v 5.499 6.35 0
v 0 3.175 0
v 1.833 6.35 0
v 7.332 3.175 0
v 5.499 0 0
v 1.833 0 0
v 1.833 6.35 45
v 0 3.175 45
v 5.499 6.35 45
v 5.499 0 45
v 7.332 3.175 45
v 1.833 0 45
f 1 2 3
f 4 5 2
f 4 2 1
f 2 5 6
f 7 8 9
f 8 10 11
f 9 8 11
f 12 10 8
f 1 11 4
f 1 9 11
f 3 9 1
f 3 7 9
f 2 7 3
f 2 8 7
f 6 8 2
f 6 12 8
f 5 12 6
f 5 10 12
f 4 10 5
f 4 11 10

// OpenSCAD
$fn = 32;

// ----------------------------------------------------------------------
// Key bar: hex key, 45 mm thick
// ----------------------------------------------------------------------

// --- parameters (mm) ---
profile_height = 45;      // extrusion height
profile_points = 6;       // points of the closed outline

profile = [[7.332, 3.175], [5.499, 6.35], [1.833, 6.35], [0, 3.175], [1.833, 0], [5.499, 0]];  // single closed polygon, 6 points, counter clockwise

// --- the one profile operation ---
linear_extrude(height = profile_height) polygon(points = profile);
